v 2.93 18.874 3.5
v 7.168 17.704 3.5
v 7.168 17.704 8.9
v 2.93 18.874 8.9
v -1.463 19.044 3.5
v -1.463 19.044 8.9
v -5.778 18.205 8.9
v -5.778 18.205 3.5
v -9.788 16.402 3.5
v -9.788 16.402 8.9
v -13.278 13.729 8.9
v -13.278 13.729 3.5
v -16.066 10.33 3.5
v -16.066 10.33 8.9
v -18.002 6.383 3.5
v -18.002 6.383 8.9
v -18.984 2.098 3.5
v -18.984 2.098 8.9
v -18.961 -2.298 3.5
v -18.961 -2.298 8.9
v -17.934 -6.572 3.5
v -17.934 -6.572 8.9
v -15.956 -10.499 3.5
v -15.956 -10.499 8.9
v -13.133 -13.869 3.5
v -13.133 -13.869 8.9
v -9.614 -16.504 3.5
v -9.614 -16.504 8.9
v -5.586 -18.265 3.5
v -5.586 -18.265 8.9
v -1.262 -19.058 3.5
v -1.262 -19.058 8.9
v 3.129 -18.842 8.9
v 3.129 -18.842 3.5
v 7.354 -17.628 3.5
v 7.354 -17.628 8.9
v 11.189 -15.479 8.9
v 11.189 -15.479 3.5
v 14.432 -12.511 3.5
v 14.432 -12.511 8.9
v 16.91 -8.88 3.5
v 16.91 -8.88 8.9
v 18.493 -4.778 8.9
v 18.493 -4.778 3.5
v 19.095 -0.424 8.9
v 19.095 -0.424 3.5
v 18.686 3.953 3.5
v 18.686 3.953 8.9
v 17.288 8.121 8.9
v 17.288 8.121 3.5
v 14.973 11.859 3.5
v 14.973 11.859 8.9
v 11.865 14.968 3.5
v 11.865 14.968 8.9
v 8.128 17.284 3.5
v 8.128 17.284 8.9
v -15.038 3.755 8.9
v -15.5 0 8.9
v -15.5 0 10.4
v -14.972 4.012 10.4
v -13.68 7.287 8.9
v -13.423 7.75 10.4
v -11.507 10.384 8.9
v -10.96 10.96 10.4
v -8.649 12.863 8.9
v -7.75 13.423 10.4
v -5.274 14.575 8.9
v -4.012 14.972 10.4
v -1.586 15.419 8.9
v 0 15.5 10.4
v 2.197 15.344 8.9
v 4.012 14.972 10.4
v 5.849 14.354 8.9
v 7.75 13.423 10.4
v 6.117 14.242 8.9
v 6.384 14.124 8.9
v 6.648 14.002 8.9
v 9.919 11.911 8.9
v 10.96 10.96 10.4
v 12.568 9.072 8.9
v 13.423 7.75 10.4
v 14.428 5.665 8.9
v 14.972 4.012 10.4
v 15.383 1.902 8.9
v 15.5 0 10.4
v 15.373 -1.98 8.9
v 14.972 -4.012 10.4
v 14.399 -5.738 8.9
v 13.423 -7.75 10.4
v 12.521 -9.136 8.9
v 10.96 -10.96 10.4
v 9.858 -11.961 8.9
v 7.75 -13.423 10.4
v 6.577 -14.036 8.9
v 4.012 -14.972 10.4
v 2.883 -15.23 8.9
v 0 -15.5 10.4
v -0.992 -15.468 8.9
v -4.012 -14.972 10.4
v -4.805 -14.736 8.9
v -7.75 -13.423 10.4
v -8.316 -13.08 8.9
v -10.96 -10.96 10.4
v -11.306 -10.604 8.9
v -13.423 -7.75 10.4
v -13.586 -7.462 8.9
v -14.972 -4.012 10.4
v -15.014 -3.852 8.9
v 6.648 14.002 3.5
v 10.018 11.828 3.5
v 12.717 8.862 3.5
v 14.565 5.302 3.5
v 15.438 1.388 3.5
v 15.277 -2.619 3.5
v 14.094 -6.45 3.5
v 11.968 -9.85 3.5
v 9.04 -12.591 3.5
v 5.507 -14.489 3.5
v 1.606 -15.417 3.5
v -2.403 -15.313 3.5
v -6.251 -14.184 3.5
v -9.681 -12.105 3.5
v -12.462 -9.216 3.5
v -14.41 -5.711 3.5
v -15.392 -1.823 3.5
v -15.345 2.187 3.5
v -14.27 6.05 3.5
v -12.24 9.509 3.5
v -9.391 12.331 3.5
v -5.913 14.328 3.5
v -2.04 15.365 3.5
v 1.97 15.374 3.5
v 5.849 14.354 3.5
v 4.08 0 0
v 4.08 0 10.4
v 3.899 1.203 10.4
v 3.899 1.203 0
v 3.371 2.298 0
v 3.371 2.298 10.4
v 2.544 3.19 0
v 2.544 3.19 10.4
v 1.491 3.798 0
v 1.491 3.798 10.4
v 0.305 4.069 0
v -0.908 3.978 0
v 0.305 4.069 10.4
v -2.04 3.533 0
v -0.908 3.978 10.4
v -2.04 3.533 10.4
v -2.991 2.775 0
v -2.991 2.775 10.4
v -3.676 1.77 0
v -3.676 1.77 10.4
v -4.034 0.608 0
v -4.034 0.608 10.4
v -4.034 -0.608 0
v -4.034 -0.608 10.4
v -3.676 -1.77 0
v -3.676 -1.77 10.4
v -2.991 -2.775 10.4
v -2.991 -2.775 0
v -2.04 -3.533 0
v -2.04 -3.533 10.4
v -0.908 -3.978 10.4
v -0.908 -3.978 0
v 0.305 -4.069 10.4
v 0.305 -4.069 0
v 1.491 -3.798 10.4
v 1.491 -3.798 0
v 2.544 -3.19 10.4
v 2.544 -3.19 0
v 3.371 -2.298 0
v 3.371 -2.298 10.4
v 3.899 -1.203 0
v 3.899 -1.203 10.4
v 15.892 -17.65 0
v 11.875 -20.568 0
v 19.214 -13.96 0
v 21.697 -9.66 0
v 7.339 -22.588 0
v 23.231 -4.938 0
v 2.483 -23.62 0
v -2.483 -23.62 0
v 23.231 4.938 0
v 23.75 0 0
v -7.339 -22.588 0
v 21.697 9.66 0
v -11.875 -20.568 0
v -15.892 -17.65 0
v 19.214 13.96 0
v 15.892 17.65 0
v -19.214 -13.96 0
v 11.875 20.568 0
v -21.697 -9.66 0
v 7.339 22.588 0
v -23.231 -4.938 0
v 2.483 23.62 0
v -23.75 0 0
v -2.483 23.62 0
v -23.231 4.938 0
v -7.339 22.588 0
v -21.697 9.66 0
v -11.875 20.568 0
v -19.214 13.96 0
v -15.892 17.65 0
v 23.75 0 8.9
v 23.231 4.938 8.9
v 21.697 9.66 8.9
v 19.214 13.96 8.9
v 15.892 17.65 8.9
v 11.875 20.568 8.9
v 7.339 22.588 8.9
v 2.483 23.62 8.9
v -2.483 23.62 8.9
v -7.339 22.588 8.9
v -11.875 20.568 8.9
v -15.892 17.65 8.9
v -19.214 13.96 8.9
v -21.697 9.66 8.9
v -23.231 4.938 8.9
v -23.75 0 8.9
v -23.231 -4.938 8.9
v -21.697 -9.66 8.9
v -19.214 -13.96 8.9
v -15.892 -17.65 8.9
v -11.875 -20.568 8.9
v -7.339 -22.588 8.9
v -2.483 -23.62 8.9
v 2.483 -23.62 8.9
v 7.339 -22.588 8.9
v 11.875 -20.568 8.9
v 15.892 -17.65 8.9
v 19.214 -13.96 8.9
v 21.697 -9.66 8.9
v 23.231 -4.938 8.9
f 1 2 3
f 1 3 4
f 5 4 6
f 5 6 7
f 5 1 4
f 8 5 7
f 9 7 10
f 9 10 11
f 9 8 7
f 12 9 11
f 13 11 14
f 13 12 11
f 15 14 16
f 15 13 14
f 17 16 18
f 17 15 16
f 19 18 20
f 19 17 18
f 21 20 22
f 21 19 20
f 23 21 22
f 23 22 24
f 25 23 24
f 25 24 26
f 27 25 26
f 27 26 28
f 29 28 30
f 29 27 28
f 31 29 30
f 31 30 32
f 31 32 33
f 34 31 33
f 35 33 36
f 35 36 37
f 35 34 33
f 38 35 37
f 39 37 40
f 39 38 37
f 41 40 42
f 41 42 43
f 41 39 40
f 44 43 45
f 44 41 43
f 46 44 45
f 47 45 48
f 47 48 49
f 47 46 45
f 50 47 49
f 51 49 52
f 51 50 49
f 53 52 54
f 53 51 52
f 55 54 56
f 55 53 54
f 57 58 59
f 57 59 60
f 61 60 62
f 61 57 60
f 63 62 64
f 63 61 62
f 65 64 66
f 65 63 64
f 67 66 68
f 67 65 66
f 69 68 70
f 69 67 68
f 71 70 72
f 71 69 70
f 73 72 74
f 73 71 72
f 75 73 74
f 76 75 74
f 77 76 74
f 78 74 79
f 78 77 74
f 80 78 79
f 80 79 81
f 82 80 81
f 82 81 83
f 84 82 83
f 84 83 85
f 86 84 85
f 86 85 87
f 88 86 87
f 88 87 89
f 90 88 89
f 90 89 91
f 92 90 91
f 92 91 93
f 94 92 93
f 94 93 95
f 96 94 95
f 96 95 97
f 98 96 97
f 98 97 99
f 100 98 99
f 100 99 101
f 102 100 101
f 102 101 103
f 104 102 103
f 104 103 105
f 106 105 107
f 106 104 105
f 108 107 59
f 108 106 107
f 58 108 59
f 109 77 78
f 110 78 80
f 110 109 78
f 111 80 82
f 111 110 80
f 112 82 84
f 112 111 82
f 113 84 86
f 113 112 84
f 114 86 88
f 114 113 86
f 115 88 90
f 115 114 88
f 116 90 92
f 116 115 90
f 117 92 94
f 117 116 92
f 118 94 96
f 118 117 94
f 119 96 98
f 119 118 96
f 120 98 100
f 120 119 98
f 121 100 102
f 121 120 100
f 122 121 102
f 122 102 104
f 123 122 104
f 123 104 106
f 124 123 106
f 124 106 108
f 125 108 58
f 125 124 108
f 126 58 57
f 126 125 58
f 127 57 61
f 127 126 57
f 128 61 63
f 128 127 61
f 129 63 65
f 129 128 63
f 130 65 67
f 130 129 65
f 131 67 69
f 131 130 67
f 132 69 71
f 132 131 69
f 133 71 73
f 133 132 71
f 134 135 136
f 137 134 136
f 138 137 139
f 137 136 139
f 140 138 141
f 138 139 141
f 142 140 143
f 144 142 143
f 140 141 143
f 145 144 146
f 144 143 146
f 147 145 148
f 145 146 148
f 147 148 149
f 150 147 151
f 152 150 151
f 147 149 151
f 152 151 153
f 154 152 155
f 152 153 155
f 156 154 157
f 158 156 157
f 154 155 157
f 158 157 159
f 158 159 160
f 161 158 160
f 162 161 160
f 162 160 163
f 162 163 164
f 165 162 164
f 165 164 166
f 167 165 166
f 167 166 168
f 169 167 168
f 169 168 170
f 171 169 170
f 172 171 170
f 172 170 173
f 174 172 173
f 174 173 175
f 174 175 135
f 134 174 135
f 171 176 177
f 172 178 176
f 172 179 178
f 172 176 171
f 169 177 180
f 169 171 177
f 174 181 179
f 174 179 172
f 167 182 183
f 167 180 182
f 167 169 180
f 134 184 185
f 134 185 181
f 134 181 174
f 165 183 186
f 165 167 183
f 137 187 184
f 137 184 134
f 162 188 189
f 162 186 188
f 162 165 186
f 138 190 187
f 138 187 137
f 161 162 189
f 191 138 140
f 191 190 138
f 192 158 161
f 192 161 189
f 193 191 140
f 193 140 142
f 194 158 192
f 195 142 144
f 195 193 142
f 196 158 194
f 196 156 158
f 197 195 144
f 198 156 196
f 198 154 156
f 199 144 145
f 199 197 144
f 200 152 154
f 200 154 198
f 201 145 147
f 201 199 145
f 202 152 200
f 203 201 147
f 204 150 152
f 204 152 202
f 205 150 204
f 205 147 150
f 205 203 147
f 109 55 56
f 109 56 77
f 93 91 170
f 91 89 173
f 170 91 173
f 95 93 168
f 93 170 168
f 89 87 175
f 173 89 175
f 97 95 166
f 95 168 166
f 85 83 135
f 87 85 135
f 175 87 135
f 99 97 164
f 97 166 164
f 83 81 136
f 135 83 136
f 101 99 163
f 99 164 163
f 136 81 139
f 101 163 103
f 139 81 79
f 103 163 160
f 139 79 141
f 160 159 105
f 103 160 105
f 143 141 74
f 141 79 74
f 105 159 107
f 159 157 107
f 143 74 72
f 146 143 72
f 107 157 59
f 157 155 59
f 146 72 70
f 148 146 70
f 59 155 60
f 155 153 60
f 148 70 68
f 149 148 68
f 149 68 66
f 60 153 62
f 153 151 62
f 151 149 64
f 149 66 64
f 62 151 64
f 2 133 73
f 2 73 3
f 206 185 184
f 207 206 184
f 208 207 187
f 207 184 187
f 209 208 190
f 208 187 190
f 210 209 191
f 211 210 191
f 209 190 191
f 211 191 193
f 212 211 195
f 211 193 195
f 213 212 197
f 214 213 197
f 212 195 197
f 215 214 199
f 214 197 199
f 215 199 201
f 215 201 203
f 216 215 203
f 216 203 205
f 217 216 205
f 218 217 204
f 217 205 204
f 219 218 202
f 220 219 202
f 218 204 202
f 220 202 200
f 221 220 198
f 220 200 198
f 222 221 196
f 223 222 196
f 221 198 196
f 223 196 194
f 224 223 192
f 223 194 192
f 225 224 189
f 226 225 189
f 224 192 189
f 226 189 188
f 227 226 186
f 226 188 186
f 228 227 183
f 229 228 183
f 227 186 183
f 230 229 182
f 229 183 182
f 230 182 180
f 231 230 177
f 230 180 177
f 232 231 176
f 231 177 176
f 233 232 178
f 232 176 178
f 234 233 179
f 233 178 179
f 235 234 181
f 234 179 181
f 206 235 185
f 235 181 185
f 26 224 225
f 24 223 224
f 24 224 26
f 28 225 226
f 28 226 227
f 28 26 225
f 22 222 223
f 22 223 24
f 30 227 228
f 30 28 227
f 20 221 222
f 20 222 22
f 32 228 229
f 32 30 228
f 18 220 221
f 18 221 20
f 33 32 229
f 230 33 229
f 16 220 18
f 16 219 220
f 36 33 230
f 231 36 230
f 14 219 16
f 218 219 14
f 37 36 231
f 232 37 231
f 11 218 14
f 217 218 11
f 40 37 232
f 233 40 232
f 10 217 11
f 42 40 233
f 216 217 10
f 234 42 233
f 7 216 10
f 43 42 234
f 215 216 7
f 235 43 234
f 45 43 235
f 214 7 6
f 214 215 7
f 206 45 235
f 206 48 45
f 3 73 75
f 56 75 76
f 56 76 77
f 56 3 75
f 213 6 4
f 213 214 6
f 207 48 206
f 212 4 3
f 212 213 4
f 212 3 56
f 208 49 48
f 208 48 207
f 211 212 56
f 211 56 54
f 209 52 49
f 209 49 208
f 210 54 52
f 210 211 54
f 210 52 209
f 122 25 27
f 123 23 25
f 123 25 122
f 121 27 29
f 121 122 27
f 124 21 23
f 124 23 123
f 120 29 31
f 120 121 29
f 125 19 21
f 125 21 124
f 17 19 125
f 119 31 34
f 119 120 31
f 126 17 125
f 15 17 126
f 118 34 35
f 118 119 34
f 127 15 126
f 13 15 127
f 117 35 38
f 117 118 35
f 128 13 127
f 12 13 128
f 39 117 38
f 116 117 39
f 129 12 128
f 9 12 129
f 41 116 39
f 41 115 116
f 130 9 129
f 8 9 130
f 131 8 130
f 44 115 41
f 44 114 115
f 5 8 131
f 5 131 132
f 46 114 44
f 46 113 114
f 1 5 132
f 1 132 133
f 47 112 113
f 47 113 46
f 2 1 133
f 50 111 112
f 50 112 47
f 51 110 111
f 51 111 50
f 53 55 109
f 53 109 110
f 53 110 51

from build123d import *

# Parameters (mm, degrees)
SKETCH1_R           = 23.75
BOSS_EXTRUDE1_DEPTH = 8.9
SKETCH3_R           = 15.5
BOSS_EXTRUDE2_DEPTH = 10.4
CUT_EXTRUDE1_START  = 5.4
CUT_EXTRUDE1_DEPTH  = 5.4
CUT_EXTRUDE2_REACH  = 37.161
SKETCH5_R           = 4.08


with BuildPart() as part:
    # Sketch1 → Boss-Extrude1 (new body)
    with BuildSketch(Plane.XY):
        Circle(SKETCH1_R)
    extrude(amount=BOSS_EXTRUDE1_DEPTH)

    # Sketch3 → Boss-Extrude2 (add)
    with BuildSketch(Plane(origin=(0, 0, 0), x_dir=(-1, 0, 0), z_dir=(0, 0, -1))):
        Circle(SKETCH3_R)
    extrude(amount=-BOSS_EXTRUDE2_DEPTH)

    # Sketch4 → Cut-Extrude1 (cut)
    with BuildSketch(Plane(origin=(0, 0, 8.9), x_dir=(-1, 0, 0), z_dir=(0, 0, -1)).offset(CUT_EXTRUDE1_START)):
        with BuildLine():
            Line((-5.848746097, 14.354169049), (-7.167594485, 17.704112214))
            ThreePointArc((-7.167594485, 17.704112214), (7.650920777, -17.50066888), (-8.128479811, 17.284033556))
            Line((-8.128479811, 17.284033556), (-6.648360671, 14.001760617))
            ThreePointArc((-6.648360671, 14.001760617), (6.251037299, -14.183600836), (-5.848746097, 14.354169049))
        make_face()
    extrude(amount=-CUT_EXTRUDE1_DEPTH, mode=Mode.SUBTRACT)

    # Sketch5 → Cut-Extrude2 (cut, up to next)
    with BuildSketch(Plane.XY.offset(10.4), mode=Mode.PRIVATE) as cut_extrude2_sk1:
        Circle(SKETCH5_R)
    cut_extrude2_tool1 = extrude(cut_extrude2_sk1.sketch, amount=-CUT_EXTRUDE2_REACH, mode=Mode.PRIVATE) & part.part
    add(cut_extrude2_tool1.solids().sort_by_distance((0, 0, 10.4))[0], mode=Mode.SUBTRACT)


solid = part.part
